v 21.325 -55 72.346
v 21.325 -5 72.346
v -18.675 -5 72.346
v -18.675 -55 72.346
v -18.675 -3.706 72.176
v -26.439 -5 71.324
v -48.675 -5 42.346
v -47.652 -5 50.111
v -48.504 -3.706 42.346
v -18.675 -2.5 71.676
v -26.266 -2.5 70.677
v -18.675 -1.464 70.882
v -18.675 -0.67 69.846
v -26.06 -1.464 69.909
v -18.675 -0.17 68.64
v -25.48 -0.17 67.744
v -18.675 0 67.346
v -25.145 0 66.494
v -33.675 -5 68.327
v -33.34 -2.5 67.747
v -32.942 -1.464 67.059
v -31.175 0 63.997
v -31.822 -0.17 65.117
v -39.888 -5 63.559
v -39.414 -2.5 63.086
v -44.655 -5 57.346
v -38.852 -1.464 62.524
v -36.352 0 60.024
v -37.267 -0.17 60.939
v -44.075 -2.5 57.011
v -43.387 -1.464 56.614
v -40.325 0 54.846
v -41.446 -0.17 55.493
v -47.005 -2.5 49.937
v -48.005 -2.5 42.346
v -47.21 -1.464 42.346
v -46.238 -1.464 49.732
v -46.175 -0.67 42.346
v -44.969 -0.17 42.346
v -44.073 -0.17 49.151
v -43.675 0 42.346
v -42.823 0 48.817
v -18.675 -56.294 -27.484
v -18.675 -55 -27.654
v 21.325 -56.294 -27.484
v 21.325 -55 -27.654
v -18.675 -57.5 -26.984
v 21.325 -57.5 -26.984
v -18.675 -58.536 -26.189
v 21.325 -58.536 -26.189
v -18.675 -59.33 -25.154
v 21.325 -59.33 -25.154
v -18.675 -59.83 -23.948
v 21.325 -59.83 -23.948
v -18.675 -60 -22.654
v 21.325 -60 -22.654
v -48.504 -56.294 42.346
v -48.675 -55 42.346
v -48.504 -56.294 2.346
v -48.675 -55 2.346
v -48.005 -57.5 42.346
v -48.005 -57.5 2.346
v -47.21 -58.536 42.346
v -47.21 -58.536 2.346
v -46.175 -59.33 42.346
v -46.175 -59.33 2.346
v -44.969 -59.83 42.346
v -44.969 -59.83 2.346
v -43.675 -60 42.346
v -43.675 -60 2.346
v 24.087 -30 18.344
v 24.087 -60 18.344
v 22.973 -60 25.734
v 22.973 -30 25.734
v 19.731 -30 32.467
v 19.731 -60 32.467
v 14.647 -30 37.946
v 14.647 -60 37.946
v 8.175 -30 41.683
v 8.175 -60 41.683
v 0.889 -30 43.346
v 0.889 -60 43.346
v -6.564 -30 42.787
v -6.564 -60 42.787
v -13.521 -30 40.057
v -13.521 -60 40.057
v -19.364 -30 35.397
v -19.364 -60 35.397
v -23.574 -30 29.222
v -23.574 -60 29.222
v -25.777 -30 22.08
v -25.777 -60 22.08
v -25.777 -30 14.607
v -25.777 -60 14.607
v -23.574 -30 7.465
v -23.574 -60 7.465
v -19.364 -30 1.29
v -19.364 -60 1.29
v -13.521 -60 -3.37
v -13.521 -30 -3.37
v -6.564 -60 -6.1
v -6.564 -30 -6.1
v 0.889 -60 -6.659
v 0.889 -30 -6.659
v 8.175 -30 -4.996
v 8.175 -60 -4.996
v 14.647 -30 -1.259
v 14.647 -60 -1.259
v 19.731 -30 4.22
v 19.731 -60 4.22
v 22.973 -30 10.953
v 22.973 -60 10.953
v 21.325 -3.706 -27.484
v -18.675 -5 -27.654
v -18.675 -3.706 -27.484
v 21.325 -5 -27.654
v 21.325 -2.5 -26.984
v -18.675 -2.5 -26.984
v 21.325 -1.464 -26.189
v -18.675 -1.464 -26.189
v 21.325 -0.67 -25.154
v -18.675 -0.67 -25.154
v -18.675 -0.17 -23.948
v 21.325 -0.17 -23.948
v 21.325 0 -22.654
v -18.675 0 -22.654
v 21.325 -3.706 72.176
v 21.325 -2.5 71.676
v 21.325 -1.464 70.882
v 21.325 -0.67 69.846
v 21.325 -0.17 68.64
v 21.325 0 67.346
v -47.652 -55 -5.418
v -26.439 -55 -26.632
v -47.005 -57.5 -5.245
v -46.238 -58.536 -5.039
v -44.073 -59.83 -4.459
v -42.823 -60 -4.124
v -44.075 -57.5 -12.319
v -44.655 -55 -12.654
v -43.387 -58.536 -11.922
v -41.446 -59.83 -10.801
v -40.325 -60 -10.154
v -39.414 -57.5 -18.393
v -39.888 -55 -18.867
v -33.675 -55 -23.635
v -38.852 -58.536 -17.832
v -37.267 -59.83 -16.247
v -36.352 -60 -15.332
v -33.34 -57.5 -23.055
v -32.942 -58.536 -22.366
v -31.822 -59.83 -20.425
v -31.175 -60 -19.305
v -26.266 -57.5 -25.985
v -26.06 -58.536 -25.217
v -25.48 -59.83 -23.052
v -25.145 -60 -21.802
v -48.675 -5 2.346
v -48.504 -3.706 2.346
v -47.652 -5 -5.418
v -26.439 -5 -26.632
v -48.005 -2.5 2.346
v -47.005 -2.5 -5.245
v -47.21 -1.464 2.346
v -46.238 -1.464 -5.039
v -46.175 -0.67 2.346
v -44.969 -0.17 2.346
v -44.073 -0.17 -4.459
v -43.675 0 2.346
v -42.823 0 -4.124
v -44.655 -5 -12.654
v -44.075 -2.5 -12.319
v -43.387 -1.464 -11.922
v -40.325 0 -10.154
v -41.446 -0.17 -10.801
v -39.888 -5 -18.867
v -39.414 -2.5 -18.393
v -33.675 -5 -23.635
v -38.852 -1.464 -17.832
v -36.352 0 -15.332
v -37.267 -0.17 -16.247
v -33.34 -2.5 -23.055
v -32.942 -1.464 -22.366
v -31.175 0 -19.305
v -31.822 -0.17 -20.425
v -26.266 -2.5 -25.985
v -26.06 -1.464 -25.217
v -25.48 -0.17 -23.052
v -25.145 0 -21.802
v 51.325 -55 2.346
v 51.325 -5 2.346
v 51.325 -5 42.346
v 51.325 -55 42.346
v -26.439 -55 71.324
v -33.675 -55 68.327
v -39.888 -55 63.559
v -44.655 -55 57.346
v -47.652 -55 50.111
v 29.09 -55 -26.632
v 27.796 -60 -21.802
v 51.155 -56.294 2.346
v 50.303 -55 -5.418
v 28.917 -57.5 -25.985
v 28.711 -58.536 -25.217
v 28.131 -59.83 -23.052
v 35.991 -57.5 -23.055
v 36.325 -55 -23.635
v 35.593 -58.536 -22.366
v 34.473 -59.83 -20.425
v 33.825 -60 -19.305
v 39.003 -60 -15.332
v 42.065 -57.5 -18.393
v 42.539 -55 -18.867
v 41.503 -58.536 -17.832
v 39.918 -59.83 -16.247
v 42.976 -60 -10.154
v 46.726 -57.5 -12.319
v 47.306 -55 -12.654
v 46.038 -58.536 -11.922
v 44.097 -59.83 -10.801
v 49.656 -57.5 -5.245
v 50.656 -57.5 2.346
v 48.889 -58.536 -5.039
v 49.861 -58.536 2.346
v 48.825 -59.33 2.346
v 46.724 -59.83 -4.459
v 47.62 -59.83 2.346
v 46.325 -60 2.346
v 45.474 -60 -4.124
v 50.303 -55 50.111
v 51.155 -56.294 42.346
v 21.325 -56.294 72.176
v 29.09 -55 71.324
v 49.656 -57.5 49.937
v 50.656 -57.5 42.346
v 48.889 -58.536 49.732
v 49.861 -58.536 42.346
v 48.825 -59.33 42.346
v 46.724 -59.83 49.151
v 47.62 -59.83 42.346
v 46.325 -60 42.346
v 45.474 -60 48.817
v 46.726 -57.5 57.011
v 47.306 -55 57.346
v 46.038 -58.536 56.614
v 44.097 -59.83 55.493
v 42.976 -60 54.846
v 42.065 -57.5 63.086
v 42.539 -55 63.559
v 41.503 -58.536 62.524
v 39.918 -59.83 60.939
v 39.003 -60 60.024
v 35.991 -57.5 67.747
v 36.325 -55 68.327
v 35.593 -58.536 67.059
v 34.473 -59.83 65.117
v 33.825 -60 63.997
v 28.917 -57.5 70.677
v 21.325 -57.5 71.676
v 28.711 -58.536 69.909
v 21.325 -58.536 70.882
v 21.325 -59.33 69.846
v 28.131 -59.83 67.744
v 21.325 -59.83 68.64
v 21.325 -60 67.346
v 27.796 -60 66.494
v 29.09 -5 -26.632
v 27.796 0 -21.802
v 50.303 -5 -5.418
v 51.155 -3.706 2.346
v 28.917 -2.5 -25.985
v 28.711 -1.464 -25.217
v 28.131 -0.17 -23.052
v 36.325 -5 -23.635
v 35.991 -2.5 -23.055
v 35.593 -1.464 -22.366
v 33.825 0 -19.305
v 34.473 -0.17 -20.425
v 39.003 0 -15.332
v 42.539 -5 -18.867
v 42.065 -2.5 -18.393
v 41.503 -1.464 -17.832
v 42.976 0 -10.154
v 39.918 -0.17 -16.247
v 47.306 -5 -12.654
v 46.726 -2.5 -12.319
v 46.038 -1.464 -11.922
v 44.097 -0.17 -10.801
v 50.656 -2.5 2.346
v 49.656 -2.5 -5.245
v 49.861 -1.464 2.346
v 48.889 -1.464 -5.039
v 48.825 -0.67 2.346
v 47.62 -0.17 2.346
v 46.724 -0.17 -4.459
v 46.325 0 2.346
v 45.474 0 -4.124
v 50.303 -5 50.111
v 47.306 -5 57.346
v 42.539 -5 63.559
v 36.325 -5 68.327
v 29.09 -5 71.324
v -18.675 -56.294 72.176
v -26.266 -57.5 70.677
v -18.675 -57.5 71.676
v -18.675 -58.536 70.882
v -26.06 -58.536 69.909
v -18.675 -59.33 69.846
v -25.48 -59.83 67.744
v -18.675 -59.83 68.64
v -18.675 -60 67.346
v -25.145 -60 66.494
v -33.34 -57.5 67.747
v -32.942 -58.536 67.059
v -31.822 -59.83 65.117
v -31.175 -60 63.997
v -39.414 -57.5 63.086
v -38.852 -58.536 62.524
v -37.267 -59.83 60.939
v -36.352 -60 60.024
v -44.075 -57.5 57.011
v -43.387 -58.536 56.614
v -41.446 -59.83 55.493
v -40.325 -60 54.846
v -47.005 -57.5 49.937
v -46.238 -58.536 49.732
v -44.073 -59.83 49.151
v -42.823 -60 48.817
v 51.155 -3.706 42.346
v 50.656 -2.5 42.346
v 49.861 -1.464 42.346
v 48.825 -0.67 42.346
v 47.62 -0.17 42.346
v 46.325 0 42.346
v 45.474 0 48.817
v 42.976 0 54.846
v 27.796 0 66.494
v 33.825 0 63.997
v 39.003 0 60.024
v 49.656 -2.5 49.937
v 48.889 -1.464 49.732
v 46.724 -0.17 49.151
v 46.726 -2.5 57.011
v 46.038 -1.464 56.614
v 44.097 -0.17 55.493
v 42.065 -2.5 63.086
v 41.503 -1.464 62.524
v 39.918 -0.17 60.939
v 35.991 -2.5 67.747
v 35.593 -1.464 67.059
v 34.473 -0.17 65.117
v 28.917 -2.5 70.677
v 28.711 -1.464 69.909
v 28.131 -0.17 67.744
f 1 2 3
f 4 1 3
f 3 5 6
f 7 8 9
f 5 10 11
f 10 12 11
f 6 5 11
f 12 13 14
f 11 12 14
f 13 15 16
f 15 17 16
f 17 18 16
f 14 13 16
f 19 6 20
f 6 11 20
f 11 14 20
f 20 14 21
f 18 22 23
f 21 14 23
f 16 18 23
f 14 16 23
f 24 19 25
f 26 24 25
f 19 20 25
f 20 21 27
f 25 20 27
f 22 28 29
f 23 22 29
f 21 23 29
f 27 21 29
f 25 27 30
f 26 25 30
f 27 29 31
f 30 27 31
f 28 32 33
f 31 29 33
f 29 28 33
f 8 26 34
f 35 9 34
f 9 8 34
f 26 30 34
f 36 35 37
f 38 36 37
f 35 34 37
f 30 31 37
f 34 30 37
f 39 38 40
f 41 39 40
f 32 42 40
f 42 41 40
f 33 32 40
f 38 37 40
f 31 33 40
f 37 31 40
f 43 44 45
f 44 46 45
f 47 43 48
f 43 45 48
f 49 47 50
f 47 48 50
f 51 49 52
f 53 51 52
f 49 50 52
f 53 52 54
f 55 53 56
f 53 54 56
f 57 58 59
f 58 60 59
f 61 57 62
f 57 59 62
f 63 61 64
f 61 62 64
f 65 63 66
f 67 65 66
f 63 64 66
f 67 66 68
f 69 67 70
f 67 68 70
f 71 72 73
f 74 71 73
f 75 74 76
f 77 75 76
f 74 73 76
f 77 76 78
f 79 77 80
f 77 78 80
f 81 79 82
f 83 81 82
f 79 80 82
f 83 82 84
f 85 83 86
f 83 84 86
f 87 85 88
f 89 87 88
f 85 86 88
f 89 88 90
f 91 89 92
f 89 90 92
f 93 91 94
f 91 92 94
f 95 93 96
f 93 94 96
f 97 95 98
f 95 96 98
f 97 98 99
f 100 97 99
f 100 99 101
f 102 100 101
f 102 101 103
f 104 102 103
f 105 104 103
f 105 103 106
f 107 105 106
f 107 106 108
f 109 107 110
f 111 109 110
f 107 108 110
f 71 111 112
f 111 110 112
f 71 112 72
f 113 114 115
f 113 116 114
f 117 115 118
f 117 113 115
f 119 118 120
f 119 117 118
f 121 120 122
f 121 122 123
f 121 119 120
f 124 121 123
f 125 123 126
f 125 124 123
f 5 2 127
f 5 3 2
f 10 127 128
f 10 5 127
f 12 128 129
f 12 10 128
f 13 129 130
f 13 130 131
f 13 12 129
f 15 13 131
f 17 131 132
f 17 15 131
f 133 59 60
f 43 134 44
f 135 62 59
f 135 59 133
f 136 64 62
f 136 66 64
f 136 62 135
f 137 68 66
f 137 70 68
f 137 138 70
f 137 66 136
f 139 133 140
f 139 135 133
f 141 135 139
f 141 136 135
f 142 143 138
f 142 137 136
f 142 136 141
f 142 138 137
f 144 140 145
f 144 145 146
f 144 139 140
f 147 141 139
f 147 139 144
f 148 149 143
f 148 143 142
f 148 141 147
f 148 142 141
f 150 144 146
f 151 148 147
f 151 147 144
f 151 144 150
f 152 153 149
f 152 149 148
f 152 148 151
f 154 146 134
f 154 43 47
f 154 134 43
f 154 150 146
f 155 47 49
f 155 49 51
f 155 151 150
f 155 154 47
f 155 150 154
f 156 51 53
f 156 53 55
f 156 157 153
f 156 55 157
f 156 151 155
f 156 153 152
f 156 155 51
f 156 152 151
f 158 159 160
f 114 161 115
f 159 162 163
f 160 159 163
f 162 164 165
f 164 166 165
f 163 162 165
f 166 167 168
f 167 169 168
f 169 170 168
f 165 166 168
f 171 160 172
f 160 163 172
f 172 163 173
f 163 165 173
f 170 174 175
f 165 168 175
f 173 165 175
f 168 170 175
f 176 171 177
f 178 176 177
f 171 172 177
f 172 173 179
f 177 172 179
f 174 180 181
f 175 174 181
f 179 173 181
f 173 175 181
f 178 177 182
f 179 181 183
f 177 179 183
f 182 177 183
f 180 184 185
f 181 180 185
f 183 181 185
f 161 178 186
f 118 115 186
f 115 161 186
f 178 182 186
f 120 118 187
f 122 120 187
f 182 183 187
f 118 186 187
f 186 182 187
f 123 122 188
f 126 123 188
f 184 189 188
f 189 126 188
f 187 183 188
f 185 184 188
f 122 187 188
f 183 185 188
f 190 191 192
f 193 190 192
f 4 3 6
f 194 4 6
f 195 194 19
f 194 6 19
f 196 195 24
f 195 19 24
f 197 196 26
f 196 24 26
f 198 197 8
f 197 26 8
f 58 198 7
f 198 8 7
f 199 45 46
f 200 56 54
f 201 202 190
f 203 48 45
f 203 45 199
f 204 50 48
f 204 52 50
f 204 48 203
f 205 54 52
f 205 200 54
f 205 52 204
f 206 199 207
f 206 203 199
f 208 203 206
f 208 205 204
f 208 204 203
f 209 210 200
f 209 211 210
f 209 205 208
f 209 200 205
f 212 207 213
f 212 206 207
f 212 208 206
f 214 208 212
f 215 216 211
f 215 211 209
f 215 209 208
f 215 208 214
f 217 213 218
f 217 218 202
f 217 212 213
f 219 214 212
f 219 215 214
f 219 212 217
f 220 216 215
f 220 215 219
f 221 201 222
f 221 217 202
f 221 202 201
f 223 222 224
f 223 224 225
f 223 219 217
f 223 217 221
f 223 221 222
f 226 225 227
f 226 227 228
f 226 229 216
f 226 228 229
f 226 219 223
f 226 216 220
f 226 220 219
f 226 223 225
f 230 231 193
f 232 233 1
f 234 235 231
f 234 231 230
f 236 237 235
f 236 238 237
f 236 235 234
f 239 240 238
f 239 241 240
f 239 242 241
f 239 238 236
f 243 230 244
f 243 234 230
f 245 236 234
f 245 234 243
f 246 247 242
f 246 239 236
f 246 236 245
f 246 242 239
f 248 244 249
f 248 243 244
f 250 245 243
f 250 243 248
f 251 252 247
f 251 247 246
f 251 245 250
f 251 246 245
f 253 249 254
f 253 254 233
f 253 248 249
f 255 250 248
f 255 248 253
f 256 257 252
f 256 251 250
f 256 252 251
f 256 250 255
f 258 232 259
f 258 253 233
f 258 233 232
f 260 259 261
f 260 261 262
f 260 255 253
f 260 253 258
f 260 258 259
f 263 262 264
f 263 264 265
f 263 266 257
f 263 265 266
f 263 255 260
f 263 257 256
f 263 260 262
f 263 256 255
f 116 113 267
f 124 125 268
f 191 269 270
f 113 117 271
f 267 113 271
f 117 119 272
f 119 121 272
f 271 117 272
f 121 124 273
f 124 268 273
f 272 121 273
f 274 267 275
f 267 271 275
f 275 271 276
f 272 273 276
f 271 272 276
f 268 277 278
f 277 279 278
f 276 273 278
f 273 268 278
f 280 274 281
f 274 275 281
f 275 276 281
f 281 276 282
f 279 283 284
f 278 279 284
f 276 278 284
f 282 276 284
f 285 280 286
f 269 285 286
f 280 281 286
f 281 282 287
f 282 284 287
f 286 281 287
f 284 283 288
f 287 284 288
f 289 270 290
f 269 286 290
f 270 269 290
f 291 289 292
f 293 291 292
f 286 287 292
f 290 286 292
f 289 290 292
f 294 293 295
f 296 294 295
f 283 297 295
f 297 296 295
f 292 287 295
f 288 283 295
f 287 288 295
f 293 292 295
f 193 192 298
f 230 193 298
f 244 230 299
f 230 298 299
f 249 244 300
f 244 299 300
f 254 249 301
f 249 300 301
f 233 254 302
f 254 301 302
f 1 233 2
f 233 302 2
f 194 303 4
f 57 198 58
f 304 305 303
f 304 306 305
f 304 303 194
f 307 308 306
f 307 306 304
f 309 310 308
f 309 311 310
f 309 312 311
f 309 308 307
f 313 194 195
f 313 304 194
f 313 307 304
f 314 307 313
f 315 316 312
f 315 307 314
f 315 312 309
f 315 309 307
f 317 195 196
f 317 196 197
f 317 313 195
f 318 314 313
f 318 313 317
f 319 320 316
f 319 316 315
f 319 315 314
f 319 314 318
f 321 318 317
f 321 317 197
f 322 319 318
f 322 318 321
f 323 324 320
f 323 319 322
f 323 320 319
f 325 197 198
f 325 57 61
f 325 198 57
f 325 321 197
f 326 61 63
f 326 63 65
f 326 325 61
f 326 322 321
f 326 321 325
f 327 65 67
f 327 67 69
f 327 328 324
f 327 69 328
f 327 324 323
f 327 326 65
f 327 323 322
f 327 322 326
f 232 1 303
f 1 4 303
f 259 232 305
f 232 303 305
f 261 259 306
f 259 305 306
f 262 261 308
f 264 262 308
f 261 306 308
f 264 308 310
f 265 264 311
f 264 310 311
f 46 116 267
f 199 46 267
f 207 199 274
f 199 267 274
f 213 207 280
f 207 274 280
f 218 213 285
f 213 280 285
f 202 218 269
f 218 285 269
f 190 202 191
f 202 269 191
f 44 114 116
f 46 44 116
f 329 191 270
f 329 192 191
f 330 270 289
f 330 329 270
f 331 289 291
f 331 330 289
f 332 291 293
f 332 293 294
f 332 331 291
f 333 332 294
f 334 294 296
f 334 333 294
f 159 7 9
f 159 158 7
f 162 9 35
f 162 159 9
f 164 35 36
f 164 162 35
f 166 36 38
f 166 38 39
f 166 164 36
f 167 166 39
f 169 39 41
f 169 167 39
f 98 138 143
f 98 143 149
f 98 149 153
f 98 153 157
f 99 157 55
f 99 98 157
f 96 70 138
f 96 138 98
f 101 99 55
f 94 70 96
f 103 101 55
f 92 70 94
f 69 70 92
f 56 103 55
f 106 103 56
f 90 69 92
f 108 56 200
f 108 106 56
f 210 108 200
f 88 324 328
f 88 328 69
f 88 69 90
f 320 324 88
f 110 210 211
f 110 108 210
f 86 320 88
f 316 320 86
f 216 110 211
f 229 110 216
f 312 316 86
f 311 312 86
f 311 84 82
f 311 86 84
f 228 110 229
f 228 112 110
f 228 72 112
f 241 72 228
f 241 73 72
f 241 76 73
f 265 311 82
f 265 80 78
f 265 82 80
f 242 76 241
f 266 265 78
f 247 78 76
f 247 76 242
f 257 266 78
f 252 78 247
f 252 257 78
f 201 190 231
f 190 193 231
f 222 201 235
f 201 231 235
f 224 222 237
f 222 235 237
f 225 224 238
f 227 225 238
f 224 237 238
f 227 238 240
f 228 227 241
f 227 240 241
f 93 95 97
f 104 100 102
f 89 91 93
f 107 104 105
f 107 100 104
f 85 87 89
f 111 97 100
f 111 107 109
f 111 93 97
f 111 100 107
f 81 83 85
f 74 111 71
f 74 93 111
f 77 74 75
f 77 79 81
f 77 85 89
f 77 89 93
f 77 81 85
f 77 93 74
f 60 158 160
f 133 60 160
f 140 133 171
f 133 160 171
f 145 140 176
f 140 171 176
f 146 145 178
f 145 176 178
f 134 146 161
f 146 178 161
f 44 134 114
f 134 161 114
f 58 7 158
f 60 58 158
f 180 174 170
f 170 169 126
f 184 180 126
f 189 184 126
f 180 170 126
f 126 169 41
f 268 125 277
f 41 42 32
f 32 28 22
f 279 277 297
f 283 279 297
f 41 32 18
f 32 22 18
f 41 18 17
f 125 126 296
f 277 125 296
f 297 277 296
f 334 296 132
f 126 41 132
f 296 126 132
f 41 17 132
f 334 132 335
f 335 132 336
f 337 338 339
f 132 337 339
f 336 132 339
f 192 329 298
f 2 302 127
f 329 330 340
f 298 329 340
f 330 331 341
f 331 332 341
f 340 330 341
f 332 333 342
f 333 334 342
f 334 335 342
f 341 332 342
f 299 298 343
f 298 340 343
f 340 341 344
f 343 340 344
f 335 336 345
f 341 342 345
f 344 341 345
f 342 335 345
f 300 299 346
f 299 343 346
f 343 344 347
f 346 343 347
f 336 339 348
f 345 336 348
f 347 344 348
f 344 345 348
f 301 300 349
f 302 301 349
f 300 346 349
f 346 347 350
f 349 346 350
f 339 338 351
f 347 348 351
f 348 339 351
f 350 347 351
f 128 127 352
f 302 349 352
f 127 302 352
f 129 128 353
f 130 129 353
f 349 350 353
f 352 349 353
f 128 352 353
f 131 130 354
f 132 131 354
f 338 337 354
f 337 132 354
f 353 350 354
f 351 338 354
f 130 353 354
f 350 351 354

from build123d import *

# Parameters (mm, degrees)
F1_DEPTH = 60
F2_R     = 5
F3_R     = 25.0723290406
F4_DEPTH = 30


# Not quite as in the source:
# - a feature names something its author has since deleted; it is built from what else it names


with BuildPart() as f1:
    # F0 (on Front) → F1 (new body)
    with BuildSketch(Plane.XZ):
        with BuildLine():
            Line((21.3254676014, 72.3460770576), (-18.6745323986, 72.3460770576))
            ThreePointArc((-18.6745323986, 72.3460770576), (-39.8877358342, 63.5592804932), (-48.6745323986, 42.3460770576))
            Line((-48.6745323986, 42.3460770576), (-48.6745323986, 2.3460770576))
            ThreePointArc((-48.6745323986, 2.3460770576), (-39.8877358342, -18.867126378), (-18.6745323986, -27.6539229424))
            Line((-18.6745323986, -27.6539229424), (21.3254676014, -27.6539229424))
            ThreePointArc((21.3254676014, -27.6539229424), (42.538671037, -18.867126378), (51.3254676014, 2.3460770576))
            Line((51.3254676014, 2.3460770576), (51.3254676014, 42.3460770576))
            ThreePointArc((51.3254676014, 42.3460770576), (42.538671037, 63.5592804932), (21.3254676014, 72.3460770576))
        make_face()
    extrude(amount=F1_DEPTH)

    # F2
    f2_edges = [f1.edges().sort_by_distance(p)[0] for p in [
        (51.325468, -30, 42.346077),
        (21.325468, -30, 72.346077),
        (42.538671, 0, 63.55928),
        (42.538671, -60, 63.55928),
    ]]
    fillet(f2_edges, radius=F2_R)

    # F3 (on face) → F4 (cut)
    with BuildSketch(Plane.XZ.offset(60)):
        with Locations((-0.98494126, 18.3436237276)):
            Circle(F3_R)
    extrude(amount=-F4_DEPTH, mode=Mode.SUBTRACT)


solid = f1.part
